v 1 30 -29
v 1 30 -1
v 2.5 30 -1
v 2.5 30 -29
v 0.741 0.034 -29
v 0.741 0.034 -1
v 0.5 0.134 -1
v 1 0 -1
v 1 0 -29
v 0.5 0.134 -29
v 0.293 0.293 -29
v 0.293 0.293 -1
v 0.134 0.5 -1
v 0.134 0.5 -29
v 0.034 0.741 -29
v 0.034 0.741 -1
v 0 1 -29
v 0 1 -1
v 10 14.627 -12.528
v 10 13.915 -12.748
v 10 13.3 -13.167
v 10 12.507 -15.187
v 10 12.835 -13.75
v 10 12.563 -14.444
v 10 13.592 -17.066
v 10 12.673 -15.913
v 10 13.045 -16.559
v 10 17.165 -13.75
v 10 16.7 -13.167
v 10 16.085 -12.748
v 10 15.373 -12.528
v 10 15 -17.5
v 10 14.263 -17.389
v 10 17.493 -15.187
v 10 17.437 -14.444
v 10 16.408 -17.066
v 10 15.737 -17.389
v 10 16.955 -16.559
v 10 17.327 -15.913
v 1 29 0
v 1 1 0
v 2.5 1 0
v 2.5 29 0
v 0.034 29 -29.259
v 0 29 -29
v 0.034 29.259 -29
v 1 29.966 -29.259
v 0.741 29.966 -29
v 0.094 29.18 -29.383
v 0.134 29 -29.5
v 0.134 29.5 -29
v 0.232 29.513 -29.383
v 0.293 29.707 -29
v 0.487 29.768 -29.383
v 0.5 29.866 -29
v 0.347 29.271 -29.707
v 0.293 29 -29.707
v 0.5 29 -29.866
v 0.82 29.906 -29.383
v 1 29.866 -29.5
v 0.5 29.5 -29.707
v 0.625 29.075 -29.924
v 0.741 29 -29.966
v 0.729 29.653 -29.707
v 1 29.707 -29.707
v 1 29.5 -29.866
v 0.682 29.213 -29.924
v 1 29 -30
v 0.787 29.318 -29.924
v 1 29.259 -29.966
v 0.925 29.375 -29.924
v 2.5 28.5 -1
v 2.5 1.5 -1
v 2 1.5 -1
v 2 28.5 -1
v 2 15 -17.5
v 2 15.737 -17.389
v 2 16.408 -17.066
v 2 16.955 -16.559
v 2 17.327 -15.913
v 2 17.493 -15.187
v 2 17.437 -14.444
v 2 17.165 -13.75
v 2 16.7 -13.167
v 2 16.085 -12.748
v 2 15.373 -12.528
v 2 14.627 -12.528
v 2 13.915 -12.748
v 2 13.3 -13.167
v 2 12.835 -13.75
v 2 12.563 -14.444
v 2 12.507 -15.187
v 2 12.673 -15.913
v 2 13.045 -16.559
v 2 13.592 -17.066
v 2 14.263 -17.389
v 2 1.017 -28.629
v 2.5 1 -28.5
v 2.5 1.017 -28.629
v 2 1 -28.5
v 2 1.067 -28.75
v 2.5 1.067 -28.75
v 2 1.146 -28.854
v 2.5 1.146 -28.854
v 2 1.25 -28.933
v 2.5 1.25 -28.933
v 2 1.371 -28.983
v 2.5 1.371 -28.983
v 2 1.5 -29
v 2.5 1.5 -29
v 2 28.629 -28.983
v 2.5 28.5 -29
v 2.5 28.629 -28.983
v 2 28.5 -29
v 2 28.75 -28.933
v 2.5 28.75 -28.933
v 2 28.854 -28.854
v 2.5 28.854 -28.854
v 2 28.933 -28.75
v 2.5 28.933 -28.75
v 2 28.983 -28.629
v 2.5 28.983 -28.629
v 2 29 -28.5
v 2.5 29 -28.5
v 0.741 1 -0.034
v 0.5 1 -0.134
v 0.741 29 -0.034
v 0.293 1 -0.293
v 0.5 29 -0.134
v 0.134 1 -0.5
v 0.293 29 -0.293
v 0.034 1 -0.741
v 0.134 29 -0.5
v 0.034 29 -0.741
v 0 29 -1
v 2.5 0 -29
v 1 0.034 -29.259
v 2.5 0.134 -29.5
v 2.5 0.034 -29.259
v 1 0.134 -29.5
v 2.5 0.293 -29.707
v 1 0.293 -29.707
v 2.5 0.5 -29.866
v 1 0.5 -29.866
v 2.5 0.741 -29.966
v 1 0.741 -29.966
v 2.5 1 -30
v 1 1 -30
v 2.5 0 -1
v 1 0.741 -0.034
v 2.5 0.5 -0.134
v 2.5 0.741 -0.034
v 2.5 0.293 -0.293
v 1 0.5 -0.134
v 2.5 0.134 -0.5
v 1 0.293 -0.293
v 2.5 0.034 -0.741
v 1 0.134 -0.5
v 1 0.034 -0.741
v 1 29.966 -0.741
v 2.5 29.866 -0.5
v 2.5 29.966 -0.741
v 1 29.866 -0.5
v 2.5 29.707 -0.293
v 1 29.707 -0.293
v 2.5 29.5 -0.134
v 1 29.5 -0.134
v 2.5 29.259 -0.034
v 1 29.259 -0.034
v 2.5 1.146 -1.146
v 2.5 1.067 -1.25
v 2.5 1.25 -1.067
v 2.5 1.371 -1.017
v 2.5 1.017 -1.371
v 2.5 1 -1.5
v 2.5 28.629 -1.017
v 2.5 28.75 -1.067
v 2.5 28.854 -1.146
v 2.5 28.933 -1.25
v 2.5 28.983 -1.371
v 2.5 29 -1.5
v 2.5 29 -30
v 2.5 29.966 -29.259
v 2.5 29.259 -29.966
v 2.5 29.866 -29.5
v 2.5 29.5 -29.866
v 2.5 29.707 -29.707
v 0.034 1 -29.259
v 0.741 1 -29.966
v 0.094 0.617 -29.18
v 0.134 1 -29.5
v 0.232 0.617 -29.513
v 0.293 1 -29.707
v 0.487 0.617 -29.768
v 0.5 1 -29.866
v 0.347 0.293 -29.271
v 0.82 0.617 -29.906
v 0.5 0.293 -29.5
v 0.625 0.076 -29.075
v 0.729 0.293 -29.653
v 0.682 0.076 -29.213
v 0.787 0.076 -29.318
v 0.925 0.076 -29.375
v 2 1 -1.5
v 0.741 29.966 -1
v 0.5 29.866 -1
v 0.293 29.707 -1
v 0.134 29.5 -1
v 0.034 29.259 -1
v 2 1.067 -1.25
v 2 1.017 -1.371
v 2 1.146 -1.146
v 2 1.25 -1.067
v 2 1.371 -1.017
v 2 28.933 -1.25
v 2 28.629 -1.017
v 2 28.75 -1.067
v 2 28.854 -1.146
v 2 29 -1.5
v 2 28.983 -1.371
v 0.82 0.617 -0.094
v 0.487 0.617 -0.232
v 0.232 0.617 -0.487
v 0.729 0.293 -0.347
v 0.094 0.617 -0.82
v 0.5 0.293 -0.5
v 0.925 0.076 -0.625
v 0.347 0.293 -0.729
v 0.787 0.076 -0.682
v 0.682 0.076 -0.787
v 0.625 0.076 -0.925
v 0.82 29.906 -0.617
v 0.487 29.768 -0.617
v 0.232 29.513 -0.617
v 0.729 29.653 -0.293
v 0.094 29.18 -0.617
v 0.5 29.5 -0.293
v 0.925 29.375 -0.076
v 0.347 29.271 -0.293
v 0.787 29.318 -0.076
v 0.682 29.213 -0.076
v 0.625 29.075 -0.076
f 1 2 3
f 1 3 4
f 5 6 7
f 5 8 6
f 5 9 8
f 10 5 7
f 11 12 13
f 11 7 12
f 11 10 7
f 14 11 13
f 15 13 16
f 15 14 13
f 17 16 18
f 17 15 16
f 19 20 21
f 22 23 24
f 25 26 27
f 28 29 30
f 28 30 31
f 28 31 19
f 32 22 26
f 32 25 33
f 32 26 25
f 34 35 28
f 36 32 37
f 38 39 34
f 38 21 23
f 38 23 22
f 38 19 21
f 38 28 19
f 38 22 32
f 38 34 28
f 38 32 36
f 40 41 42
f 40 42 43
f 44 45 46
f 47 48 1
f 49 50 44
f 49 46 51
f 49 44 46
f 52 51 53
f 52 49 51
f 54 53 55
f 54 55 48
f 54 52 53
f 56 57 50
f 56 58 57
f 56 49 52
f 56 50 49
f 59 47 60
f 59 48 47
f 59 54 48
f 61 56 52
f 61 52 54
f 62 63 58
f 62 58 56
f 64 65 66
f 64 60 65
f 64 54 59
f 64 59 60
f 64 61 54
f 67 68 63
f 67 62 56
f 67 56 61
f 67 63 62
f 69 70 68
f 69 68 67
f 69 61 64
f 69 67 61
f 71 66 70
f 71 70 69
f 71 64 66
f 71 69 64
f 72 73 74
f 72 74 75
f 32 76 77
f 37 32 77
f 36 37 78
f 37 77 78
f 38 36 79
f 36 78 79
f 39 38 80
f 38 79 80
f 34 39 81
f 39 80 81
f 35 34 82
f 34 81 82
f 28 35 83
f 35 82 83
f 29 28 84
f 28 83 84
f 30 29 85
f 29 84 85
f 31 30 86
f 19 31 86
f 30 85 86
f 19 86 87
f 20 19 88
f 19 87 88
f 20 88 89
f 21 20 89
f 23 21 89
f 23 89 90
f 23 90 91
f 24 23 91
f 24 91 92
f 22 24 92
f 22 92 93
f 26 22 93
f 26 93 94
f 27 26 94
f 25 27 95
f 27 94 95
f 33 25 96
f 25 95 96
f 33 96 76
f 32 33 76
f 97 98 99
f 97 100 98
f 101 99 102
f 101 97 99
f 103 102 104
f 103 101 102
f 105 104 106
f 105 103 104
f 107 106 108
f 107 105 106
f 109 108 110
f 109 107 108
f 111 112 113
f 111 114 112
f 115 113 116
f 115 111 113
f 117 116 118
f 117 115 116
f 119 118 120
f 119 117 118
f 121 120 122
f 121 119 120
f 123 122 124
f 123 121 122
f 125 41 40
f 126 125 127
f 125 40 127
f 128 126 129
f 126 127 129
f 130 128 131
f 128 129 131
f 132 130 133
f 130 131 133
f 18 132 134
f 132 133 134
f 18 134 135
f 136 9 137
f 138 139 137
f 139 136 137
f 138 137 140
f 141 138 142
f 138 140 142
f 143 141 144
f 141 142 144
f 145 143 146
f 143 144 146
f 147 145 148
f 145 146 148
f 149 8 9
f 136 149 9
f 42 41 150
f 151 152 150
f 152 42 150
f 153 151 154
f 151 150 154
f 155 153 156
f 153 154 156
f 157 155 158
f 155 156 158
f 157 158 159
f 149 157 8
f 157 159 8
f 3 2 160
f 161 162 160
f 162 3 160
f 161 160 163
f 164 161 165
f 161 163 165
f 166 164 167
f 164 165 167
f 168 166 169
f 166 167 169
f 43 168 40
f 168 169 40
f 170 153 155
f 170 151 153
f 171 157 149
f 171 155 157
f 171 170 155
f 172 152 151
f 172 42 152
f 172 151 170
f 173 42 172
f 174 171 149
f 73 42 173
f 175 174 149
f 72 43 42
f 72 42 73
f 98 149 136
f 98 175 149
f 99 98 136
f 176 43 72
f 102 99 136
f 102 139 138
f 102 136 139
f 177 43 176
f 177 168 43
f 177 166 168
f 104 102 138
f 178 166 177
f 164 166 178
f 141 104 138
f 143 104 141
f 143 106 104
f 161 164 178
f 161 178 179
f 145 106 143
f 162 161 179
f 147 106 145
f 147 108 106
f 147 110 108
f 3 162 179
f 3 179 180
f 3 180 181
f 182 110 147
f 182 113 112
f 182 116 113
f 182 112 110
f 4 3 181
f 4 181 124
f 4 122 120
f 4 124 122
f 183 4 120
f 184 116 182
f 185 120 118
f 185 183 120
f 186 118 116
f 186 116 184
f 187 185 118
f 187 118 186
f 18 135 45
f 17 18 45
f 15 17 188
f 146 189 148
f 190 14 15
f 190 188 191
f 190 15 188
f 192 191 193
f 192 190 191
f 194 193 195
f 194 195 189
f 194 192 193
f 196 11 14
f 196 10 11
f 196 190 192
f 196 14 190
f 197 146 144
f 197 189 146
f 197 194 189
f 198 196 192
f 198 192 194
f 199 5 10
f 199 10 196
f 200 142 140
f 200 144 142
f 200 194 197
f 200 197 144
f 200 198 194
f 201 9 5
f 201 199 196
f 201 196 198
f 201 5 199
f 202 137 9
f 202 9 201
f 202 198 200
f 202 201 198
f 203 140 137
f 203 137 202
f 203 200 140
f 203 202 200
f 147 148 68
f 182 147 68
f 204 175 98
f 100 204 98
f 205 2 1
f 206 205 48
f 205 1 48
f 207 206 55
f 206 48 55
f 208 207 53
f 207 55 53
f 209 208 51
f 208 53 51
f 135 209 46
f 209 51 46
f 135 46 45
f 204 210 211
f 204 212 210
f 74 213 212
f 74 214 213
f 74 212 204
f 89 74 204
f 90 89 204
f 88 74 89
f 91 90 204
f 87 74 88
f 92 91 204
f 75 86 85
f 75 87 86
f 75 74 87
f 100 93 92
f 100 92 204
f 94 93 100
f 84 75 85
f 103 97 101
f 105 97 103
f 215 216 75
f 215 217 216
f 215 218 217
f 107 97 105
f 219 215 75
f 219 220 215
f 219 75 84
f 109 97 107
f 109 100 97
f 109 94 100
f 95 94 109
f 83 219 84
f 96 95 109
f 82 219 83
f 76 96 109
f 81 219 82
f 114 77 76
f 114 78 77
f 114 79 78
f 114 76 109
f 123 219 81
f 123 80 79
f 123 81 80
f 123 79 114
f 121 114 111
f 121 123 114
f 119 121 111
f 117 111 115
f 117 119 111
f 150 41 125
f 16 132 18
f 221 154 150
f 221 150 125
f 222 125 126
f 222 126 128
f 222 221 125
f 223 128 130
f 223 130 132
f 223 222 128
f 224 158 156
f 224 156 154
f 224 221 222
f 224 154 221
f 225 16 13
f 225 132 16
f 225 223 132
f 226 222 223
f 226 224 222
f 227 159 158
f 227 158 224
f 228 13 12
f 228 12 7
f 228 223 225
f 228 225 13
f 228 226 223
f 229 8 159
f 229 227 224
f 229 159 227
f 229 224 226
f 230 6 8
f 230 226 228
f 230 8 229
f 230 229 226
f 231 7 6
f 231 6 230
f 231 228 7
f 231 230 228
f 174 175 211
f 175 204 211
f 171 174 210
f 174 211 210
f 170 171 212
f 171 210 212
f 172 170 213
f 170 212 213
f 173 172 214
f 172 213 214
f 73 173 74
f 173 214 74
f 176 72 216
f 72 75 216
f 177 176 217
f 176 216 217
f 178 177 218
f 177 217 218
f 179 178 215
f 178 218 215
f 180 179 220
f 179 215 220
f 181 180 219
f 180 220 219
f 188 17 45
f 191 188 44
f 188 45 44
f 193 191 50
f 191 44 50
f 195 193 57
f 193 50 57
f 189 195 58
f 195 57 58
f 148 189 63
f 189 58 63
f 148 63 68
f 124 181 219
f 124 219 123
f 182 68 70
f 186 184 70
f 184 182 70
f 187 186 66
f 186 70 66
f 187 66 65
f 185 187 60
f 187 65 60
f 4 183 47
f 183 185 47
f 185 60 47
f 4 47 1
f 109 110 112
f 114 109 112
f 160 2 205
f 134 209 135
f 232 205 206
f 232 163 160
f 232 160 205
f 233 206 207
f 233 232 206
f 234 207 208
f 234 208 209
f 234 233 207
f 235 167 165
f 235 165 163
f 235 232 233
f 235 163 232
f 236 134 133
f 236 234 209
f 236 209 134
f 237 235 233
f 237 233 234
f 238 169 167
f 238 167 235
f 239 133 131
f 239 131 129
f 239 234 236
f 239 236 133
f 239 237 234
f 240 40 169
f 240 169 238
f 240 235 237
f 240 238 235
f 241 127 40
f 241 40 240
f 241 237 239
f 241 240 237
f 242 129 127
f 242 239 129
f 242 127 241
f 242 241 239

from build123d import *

# Parameters (mm, degrees)
SKETCH2_W           = 30
SKETCH2_H           = 30
BOSS_EXTRUDE1_DEPTH = 2.5
SKETCH3_W           = 28
SKETCH3_H           = 28
CUT_EXTRUDE1_DEPTH  = 0.5
FILLET1_R           = 1
FILLET2_R           = 1
FILLET3_R           = 0.5
SKETCH5_R           = 2.5
BOSS_EXTRUDE2_DEPTH = 8


with BuildPart() as part:
    # Sketch2 → Boss-Extrude1 (new body)
    with BuildSketch(Plane(origin=(0, 0, 0), x_dir=(0, 0, -1), z_dir=(1, 0, 0))):
        with Locations((15, 15)):
            Rectangle(SKETCH2_W, SKETCH2_H)
    extrude(amount=BOSS_EXTRUDE1_DEPTH)

    # Sketch3 → Cut-Extrude1 (cut)
    with BuildSketch(Plane(origin=(2.5, 0, 0), x_dir=(0, 0, -1), z_dir=(1, 0, 0))):
        with Locations((15, 15)):
            Rectangle(SKETCH3_W, SKETCH3_H)
    extrude(amount=-CUT_EXTRUDE1_DEPTH, mode=Mode.SUBTRACT)

    # Fillet1
    fillet1_edges = [part.edges().sort_by_distance(p)[0] for p in [
        (0, 30, -15),
        (0, 15, -30),
        (0, 0, -15),
        (0, 15, 0),
    ]]
    fillet(fillet1_edges, radius=FILLET1_R)

    # Fillet2
    # the kernel refuses this fillet: 1 mm, written as the material it takes off along each edge
    with BuildSketch(Plane(origin=(1, 29, -1), x_dir=(0, 1, 0), z_dir=(0, 0, 1))) as fillet2_piece_1_section:
        Polygon((0, 0), (FILLET2_R, 0), (FILLET2_R, FILLET2_R), (0, FILLET2_R), align=None)
    fillet2_piece_1 = extrude(amount=FILLET2_R, mode=Mode.PRIVATE)
    fillet2_piece_1 = fillet2_piece_1 - Plane(origin=(1, 29, -1), x_dir=(0.7071067811865475, -0.7071067811865475, 0), z_dir=(0, 0, 1)) * Sphere(FILLET2_R, mode=Mode.PRIVATE)
    add(fillet2_piece_1, mode=Mode.SUBTRACT)
    with BuildSketch(Plane(origin=(1, 29, -29), x_dir=(0, 1, 0), z_dir=(0, 0, -1))) as fillet2_piece_2_section:
        Polygon((0, 0), (FILLET2_R, 0), (FILLET2_R, -FILLET2_R), (0, -FILLET2_R), align=None)
    fillet2_piece_2 = extrude(amount=FILLET2_R, mode=Mode.PRIVATE)
    fillet2_piece_2 = fillet2_piece_2 - Plane(origin=(1, 29, -29), x_dir=(0.7071067811865475, -0.7071067811865475, 0), z_dir=(0, 0, -1)) * Sphere(FILLET2_R, mode=Mode.PRIVATE)
    add(fillet2_piece_2, mode=Mode.SUBTRACT)
    with BuildSketch(Plane(origin=(1, 1, -1), x_dir=(0, 0, 1), z_dir=(0, -1, 0))) as fillet2_piece_3_section:
        Polygon((0, 0), (FILLET2_R, 0), (FILLET2_R, FILLET2_R), (0, FILLET2_R), align=None)
    fillet2_piece_3 = extrude(amount=FILLET2_R, mode=Mode.PRIVATE)
    fillet2_piece_3 = fillet2_piece_3 - Plane(origin=(1, 1, -1), x_dir=(0.7071067811865475, 0, -0.7071067811865475), z_dir=(0, -1, 0)) * Sphere(FILLET2_R, mode=Mode.PRIVATE)
    add(fillet2_piece_3, mode=Mode.SUBTRACT)
    with BuildSketch(Plane(origin=(1, 1, -29), x_dir=(0, 0, -1), z_dir=(0, -1, 0))) as fillet2_piece_4_section:
        Polygon((0, 0), (FILLET2_R, 0), (FILLET2_R, -FILLET2_R), (0, -FILLET2_R), align=None)
    fillet2_piece_4 = extrude(amount=FILLET2_R, mode=Mode.PRIVATE)
    fillet2_piece_4 = fillet2_piece_4 - Plane(origin=(1, 1, -29), x_dir=(0.7071067811865475, 0, 0.7071067811865475), z_dir=(0, -1, 0)) * Sphere(FILLET2_R, mode=Mode.PRIVATE)
    add(fillet2_piece_4, mode=Mode.SUBTRACT)
    with BuildSketch(Plane(origin=(1, 30, 0), x_dir=(0, -1, 0), z_dir=(1, 0, 0)), Plane(origin=(1, 0, 0), x_dir=(0, 0, -1), z_dir=(1, 0, 0))) as fillet2_piece_5:
        with BuildLine():
            CenterArc((FILLET2_R, FILLET2_R), FILLET2_R, 180, 90)
            Line((0, FILLET2_R), (0, 0))
            Line((0, 0), (FILLET2_R, 0))
        make_face()
    extrude(amount=4, mode=Mode.SUBTRACT)
    with BuildSketch(Plane(origin=(1, 30, -30), x_dir=(0, -1, 0), z_dir=(1, 0, 0)), Plane(origin=(1, 0, -30), x_dir=(0, 0, 1), z_dir=(1, 0, 0))) as fillet2_piece_6:
        with BuildLine():
            CenterArc((FILLET2_R, -FILLET2_R), FILLET2_R, 90, 90)
            Line((0, -FILLET2_R), (0, 0))
            Line((0, 0), (FILLET2_R, 0))
        make_face()
    extrude(amount=4, mode=Mode.SUBTRACT)

    # Fillet3
    fillet3_edges = [part.edges().sort_by_distance(p)[0] for p in [
        (2.25, 1, -1),
        (2.25, 29, -1),
        (2.25, 29, -29),
        (2.25, 1, -29),
    ]]
    fillet(fillet3_edges, radius=FILLET3_R)

    # Sketch5 → Boss-Extrude2 (add)
    with BuildSketch(Plane(origin=(2, 0, 0), x_dir=(0, 0, -1), z_dir=(1, 0, 0))):
        with Locations((15, 15)):
            Circle(SKETCH5_R)
    extrude(amount=BOSS_EXTRUDE2_DEPTH)


solid = part.part
